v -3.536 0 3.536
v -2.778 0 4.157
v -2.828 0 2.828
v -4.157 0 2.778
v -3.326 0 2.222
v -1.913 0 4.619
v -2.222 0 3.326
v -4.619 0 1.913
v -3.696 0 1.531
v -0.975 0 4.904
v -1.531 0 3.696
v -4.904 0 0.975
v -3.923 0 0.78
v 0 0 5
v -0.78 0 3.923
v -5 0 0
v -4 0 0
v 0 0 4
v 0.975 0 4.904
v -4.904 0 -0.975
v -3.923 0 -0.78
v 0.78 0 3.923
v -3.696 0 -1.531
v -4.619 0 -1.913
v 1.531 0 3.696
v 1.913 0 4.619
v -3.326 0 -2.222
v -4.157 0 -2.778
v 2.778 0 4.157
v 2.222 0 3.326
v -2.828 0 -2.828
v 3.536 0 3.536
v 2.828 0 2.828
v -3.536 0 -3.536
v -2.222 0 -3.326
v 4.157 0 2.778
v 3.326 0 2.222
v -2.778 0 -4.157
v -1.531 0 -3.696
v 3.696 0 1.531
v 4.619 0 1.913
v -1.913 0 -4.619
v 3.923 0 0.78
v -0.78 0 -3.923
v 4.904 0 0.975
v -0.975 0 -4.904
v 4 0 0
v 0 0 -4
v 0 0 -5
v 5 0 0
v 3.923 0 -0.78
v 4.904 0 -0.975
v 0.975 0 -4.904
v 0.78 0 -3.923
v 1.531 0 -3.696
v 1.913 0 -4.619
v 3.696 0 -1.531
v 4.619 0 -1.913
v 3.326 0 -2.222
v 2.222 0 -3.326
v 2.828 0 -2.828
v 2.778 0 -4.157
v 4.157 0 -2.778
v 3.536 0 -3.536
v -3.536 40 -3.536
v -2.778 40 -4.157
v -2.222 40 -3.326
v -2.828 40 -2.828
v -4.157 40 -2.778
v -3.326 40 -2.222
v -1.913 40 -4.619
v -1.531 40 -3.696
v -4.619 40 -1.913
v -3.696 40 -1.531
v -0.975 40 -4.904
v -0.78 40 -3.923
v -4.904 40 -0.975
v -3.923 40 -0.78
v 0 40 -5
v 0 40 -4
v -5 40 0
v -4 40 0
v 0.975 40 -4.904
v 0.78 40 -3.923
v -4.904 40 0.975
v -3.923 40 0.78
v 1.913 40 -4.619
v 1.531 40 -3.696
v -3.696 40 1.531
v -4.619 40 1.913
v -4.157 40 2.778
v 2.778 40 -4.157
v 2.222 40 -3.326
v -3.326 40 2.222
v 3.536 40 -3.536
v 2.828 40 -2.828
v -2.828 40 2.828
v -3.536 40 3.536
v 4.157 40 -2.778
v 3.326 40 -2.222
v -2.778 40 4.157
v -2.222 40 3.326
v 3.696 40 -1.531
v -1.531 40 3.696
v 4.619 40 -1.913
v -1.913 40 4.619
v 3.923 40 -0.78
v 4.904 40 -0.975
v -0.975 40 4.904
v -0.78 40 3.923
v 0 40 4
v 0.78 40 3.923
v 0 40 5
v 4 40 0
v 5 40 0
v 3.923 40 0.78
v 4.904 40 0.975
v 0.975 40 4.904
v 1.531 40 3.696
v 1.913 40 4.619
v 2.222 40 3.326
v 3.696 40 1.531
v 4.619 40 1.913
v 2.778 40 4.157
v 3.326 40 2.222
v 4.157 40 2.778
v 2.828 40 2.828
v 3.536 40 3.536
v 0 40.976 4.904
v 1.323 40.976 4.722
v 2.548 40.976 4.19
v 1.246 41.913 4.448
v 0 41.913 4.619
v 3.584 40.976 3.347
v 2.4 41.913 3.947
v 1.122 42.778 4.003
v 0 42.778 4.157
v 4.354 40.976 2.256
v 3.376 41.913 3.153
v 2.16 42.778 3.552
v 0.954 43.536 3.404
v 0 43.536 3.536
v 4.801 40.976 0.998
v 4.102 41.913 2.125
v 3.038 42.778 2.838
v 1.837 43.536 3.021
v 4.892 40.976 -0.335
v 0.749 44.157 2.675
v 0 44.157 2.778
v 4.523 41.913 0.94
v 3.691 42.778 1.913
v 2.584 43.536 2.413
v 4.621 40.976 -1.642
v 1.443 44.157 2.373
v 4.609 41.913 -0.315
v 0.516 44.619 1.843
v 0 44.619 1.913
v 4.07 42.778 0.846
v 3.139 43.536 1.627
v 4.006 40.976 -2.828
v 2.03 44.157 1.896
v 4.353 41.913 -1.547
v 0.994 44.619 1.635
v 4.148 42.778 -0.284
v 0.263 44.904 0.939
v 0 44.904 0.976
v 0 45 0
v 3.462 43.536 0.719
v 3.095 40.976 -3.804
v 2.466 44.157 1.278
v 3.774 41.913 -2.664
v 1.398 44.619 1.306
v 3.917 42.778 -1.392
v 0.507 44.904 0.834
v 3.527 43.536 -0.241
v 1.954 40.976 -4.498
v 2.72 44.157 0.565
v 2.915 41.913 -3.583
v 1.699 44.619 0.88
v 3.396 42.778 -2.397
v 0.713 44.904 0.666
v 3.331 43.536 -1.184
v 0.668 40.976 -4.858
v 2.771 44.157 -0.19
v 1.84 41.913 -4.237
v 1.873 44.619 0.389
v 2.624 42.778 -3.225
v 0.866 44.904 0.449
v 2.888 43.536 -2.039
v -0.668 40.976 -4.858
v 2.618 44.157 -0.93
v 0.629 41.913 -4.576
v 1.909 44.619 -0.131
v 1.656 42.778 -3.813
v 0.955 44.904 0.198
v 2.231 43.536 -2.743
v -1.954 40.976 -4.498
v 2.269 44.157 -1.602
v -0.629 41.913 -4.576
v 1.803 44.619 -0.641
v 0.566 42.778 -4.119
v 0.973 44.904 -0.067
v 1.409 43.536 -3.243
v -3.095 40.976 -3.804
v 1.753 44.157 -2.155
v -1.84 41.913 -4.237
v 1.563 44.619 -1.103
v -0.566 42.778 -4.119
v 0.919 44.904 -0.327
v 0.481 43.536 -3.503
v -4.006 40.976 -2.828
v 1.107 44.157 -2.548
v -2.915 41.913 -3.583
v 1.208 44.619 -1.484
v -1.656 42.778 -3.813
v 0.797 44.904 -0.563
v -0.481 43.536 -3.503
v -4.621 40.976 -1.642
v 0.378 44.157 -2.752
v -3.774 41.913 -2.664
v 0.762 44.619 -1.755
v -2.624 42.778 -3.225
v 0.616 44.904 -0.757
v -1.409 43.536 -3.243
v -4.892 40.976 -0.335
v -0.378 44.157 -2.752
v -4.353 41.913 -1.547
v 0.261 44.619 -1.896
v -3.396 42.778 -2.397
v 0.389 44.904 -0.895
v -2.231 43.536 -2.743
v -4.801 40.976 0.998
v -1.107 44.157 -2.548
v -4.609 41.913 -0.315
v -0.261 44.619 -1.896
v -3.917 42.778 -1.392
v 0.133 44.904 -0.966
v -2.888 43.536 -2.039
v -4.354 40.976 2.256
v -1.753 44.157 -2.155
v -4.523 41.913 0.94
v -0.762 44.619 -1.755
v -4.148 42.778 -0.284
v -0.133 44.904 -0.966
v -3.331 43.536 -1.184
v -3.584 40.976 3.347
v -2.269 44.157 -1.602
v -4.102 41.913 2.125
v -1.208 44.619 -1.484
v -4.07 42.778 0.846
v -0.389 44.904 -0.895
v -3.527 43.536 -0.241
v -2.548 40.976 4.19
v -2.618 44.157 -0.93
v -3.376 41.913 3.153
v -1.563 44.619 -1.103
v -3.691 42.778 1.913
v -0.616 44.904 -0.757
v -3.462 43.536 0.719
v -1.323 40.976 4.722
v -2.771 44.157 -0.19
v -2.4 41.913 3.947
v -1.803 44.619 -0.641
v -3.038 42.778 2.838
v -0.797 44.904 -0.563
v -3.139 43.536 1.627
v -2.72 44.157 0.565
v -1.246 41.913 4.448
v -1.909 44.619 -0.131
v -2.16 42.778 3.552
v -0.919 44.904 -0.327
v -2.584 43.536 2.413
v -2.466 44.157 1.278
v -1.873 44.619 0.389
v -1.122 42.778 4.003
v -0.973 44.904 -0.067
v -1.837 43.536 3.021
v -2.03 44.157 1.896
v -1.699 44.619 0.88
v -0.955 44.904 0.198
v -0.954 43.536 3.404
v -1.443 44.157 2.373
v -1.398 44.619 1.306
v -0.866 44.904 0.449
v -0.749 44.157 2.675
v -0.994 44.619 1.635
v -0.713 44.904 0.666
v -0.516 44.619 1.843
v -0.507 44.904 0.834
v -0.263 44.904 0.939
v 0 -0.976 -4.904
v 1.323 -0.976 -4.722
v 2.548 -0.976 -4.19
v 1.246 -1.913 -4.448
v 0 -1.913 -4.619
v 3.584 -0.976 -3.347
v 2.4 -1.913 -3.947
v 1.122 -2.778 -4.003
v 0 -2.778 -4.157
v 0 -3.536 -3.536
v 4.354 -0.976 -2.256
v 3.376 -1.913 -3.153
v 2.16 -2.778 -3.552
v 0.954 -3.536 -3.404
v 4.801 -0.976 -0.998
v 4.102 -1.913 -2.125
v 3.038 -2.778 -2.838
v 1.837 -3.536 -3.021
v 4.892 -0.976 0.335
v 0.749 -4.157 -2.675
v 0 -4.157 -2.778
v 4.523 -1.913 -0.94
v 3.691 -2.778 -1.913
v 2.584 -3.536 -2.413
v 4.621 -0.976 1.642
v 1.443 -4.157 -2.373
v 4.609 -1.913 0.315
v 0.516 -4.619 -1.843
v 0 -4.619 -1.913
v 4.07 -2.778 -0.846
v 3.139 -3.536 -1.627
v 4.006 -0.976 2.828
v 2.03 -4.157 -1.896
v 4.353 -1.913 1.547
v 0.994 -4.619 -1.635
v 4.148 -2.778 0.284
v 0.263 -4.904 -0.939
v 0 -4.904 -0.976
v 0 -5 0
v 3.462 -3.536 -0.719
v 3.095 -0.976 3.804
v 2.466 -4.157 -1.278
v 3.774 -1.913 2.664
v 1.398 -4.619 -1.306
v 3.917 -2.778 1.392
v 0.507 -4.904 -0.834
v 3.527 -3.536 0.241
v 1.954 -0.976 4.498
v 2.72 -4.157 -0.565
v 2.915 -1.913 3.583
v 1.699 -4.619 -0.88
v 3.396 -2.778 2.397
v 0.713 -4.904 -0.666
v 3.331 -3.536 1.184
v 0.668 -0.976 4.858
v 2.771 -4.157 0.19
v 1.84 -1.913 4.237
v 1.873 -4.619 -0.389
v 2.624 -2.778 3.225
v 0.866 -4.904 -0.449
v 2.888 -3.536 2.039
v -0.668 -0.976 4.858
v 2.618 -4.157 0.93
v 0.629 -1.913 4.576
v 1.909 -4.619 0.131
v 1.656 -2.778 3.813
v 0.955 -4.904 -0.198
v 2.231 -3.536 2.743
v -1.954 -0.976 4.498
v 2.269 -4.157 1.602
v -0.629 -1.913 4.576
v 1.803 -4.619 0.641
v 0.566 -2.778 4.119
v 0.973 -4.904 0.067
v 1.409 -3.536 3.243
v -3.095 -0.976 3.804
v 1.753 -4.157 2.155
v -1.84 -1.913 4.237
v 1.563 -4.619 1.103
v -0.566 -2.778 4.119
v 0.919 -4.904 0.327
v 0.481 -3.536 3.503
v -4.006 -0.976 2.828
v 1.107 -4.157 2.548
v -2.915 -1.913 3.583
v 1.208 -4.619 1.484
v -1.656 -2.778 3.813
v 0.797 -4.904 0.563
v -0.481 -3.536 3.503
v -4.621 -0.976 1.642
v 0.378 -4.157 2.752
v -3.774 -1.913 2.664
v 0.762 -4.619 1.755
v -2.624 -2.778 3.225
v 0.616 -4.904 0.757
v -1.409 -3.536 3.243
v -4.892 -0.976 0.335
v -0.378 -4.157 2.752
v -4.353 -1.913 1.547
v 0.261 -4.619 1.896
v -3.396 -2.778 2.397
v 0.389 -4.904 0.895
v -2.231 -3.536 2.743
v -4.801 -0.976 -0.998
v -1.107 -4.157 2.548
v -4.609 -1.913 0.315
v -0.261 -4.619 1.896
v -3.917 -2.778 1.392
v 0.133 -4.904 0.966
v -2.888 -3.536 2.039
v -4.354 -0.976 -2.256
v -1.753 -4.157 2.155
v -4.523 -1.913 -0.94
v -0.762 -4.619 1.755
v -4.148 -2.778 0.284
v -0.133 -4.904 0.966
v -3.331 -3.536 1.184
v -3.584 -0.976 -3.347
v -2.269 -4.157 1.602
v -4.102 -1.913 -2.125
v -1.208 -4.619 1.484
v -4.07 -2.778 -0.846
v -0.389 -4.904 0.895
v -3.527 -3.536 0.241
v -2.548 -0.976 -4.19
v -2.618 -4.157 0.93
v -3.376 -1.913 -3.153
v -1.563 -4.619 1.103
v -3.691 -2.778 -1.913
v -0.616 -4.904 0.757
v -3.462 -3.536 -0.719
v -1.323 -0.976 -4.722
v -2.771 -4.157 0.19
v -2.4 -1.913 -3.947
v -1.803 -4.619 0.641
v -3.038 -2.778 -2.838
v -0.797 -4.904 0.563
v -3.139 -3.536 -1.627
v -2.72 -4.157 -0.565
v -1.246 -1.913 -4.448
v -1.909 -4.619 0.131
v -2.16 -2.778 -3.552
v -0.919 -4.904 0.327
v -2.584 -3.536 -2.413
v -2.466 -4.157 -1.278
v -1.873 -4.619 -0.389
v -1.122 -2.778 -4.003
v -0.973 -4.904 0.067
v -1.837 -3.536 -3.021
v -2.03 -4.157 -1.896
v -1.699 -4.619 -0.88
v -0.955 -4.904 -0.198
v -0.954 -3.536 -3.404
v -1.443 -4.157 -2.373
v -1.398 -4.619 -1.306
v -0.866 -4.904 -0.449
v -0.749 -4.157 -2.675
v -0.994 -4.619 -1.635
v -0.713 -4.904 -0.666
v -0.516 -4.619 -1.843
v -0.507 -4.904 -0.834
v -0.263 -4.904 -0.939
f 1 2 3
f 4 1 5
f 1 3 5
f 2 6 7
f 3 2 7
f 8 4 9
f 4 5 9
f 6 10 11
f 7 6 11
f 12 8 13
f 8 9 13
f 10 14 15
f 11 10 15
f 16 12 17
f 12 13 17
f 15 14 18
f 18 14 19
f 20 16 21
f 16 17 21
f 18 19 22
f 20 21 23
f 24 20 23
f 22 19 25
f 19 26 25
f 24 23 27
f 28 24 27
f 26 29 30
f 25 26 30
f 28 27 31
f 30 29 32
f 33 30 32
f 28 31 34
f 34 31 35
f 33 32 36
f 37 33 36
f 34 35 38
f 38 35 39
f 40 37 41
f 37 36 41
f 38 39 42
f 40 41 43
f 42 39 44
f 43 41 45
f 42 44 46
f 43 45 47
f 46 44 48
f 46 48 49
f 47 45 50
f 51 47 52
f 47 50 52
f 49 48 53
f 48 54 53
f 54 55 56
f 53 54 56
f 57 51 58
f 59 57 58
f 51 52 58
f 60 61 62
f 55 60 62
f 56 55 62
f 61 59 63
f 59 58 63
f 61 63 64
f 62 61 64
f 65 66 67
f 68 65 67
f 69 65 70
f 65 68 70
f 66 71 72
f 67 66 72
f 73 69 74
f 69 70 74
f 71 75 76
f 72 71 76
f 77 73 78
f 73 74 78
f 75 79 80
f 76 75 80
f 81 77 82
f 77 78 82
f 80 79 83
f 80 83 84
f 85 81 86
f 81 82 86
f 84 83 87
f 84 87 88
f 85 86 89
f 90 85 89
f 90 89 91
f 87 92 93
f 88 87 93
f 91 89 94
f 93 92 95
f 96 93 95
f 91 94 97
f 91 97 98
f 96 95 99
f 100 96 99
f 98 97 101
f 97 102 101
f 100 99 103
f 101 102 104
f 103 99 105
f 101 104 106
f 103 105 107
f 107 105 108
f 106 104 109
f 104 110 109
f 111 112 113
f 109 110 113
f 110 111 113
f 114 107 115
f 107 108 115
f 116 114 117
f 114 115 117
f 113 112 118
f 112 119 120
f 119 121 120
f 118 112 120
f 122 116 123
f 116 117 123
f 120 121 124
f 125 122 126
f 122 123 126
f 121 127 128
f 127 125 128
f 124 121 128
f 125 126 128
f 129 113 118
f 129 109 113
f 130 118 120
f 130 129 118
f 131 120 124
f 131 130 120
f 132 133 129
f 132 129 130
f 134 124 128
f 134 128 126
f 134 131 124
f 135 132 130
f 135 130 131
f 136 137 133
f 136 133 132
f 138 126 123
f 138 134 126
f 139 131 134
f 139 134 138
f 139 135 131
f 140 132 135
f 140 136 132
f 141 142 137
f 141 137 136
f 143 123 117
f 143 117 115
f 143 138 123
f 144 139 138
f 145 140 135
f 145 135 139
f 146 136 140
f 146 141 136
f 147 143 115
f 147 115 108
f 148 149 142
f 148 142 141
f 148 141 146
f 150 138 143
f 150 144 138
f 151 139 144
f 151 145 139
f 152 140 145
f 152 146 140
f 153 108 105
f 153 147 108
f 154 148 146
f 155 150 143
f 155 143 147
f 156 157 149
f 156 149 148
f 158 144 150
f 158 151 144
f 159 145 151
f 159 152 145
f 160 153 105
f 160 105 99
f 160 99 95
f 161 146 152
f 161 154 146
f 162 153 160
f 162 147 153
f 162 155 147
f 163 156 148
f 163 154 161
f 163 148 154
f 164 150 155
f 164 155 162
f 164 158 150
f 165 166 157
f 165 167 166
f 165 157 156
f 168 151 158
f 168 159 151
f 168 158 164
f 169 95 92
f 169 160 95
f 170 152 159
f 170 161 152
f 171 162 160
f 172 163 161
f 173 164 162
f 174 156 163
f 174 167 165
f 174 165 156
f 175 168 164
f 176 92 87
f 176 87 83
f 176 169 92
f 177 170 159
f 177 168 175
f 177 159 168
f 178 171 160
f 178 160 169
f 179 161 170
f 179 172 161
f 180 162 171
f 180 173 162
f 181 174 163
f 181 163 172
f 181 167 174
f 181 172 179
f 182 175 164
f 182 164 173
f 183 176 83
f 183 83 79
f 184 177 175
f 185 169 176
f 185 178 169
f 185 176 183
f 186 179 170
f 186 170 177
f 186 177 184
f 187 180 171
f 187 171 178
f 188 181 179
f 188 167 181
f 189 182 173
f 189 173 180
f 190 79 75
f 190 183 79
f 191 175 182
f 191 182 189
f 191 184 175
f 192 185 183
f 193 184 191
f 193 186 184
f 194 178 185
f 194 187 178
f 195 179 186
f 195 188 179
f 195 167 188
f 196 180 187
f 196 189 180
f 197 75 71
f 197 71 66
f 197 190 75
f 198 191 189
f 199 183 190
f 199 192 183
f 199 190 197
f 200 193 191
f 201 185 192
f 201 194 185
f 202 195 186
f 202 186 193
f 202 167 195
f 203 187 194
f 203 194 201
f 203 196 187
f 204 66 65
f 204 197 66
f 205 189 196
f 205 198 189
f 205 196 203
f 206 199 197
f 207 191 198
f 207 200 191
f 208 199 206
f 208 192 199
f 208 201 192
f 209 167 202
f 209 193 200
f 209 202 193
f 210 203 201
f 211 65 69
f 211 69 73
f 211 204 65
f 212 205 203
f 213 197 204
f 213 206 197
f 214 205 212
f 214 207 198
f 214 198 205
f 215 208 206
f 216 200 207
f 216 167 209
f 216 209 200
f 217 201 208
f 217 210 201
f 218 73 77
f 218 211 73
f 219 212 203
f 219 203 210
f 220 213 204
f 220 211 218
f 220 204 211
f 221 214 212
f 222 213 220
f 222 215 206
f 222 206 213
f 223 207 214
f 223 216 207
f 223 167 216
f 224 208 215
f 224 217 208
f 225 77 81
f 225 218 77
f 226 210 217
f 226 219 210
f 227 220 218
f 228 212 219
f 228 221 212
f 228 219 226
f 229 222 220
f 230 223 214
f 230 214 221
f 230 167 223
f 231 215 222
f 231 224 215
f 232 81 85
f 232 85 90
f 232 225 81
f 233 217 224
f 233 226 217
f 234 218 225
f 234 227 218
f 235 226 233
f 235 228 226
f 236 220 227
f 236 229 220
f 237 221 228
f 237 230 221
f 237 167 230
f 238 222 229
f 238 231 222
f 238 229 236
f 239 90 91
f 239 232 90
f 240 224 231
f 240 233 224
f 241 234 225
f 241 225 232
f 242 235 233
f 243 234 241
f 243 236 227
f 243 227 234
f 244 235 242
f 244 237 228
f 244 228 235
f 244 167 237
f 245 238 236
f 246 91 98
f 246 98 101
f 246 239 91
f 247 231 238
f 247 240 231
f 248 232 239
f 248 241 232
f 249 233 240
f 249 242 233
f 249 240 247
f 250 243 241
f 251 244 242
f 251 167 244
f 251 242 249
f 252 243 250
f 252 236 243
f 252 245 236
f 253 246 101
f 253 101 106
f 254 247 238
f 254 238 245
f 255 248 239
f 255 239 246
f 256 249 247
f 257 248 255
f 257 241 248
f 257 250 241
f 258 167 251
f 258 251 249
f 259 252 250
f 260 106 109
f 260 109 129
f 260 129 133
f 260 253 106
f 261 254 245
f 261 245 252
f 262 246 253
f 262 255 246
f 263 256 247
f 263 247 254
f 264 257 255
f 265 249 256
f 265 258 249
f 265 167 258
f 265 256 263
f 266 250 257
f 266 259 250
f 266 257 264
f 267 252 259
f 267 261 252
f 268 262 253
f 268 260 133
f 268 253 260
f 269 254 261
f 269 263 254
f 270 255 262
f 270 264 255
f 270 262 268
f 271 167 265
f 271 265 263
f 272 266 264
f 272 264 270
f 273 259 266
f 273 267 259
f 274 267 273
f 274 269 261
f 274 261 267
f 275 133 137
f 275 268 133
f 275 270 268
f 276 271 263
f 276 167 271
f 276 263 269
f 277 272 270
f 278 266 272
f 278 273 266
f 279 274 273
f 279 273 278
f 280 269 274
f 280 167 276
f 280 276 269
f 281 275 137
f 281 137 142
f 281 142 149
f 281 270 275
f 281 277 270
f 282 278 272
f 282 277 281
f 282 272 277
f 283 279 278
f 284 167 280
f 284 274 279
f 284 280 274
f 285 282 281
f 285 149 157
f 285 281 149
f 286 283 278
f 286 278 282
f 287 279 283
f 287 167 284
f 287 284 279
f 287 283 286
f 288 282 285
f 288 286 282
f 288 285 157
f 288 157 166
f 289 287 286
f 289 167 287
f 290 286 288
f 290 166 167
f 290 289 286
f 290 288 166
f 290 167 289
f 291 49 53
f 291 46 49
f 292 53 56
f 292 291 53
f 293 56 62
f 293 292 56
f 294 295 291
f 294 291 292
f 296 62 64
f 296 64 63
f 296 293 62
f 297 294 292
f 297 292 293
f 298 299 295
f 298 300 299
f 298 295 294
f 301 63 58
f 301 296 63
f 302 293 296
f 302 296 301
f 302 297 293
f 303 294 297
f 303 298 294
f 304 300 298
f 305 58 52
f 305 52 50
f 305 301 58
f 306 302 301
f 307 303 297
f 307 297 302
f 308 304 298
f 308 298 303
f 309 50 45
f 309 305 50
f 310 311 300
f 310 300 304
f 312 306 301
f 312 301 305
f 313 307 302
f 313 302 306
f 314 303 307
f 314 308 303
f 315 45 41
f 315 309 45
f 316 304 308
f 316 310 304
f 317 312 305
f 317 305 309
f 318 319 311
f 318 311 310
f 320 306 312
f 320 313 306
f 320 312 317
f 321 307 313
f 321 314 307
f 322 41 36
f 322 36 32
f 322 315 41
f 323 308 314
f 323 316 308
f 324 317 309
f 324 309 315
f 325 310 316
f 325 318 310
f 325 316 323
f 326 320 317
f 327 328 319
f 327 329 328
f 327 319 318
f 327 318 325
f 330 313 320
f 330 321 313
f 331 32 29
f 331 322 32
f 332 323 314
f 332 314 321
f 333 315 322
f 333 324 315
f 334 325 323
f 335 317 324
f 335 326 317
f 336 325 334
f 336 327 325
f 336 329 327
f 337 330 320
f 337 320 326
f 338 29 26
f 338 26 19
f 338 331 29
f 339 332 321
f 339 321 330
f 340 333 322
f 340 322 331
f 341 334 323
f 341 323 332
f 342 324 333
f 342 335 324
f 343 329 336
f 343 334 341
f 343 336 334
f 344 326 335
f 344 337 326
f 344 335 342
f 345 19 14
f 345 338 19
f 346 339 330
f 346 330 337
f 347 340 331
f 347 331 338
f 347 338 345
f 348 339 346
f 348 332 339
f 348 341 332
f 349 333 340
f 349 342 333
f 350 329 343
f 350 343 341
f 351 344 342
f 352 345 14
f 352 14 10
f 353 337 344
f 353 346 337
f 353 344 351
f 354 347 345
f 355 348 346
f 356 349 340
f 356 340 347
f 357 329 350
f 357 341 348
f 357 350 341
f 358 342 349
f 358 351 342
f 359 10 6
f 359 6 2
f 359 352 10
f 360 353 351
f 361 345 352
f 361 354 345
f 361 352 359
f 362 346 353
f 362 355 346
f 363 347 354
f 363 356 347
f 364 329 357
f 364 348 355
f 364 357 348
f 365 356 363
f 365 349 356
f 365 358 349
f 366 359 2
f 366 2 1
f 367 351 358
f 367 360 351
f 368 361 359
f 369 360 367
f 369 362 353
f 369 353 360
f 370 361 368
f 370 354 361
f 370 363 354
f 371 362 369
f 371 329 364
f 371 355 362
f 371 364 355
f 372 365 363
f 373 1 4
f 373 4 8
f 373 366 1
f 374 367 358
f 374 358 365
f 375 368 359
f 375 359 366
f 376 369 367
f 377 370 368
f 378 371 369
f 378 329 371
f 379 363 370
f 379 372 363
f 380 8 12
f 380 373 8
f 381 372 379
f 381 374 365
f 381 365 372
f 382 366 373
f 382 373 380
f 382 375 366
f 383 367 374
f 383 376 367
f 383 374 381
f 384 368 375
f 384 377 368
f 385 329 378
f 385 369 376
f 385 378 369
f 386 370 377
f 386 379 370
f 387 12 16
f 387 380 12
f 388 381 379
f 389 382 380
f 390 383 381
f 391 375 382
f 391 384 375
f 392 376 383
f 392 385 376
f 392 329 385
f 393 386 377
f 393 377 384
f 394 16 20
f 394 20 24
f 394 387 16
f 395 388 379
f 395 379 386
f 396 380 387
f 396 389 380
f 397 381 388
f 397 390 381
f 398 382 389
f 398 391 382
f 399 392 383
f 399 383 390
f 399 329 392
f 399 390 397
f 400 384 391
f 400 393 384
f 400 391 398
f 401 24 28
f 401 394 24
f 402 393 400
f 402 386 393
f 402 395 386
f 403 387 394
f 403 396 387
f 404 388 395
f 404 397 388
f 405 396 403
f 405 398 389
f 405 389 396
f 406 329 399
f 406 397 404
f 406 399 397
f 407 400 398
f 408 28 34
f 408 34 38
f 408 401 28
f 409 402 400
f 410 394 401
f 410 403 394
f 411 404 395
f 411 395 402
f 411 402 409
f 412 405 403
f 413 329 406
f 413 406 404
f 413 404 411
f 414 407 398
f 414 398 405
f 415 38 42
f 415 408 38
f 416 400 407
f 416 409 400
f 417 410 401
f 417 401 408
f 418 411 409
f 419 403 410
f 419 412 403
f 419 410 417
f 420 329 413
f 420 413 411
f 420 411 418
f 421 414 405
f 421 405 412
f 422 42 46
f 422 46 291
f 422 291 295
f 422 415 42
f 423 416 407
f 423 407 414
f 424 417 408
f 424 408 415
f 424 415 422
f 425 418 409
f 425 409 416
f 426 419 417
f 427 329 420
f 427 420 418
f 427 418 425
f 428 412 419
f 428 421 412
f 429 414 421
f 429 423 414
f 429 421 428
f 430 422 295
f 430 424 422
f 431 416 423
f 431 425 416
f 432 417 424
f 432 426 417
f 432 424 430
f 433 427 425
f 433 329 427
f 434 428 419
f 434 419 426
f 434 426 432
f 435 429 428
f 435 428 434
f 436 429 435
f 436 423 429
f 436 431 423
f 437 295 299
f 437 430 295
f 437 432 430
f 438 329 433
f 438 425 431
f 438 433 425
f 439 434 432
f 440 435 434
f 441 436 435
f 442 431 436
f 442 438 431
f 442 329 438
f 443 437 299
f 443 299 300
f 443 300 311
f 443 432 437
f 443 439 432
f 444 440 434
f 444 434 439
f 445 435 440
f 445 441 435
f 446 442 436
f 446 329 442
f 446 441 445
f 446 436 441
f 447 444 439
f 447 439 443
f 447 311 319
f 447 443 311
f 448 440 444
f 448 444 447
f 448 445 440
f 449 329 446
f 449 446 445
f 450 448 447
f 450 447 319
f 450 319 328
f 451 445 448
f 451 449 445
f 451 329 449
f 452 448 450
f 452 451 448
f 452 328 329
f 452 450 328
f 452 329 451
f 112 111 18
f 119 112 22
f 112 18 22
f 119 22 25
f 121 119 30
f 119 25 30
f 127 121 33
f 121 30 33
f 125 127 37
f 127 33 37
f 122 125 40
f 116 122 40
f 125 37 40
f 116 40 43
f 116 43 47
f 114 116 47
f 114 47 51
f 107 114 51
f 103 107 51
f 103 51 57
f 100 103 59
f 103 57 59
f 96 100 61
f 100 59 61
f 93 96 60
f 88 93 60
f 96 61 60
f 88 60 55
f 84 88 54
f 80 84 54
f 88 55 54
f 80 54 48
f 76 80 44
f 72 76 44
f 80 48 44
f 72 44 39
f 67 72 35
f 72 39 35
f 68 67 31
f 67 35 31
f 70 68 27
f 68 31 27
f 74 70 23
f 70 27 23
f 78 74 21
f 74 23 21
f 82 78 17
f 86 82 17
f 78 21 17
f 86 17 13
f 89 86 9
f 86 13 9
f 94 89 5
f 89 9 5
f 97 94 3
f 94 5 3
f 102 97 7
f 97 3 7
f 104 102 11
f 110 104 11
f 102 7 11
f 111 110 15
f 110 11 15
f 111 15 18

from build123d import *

# Parameters (mm, degrees)
SZKIC1_R                    = 4
DODANIE_WYCI_GNI_CIE1_DEPTH = 40
SZKIC2_R                    = 5
DODANIE_WYCI_GNI_CIE2_DEPTH = 5
ZAOKR_GLENIE1_R             = 5
DODANIE_WYCI_GNI_CIE3_START = 5
SZKIC3_R                    = 5
DODANIE_WYCI_GNI_CIE3_DEPTH = 5
ZAOKR_GLENIE2_R             = 5


with BuildPart() as part:
    # Szkic1 → Dodanie-wyciągnięcie1 (new body)
    with BuildSketch(Plane(origin=(0, 0, 0), x_dir=(1, 0, 0), z_dir=(0, 1, 0))):
        with Locations(Location((0, 0, 0), (0, 0, 270))):
            Circle(SZKIC1_R)
    extrude(amount=DODANIE_WYCI_GNI_CIE1_DEPTH)

    # Szkic2 → Dodanie-wyciągnięcie2 (add)
    with BuildSketch(Plane(origin=(0, 40, 0), x_dir=(1, 0, 0), z_dir=(0, 1, 0))):
        with Locations(Location((0, 0, 0), (0, 0, 270))):
            Circle(SZKIC2_R)
    extrude(amount=DODANIE_WYCI_GNI_CIE2_DEPTH)

    # Zaokrąglenie1
    zaokr_glenie1_edges = [part.edges().sort_by_distance(p)[0] for p in [
        (0, 45, -5),
    ]]
    fillet(zaokr_glenie1_edges, radius=ZAOKR_GLENIE1_R - 0.0001)  # a hair under: the kernel refuses the full size

    # Szkic3 → Dodanie-wyciągnięcie3 (add)
    with BuildSketch(Plane.XZ.offset(DODANIE_WYCI_GNI_CIE3_START)):
        with Locations(Location((0, 0, 0), (0, 0, 270))):
            Circle(SZKIC3_R)
    extrude(amount=-DODANIE_WYCI_GNI_CIE3_DEPTH)

    # Zaokrąglenie2
    zaokr_glenie2_edges = [part.edges().sort_by_distance(p)[0] for p in [
        (0, -5, 5),
    ]]
    fillet(zaokr_glenie2_edges, radius=ZAOKR_GLENIE2_R - 0.0001)  # a hair under: the kernel refuses the full size


solid = part.part
